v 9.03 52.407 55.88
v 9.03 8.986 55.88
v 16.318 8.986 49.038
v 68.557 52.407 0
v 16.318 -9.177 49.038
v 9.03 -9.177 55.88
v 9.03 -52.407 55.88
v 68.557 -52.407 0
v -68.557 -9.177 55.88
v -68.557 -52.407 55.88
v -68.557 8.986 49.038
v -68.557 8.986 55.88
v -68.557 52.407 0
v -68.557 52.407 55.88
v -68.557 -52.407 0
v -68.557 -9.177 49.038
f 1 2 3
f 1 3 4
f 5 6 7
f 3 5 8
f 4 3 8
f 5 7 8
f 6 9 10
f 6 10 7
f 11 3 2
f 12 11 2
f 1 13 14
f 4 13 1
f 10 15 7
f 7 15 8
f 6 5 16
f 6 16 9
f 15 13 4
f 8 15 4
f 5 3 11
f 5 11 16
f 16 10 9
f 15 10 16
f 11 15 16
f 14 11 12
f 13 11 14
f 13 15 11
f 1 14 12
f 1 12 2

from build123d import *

# Parameters (mm, degrees)
F0_W     = 137.114138
F0_H     = 104.813702
F1_DEPTH = 55.88
F3_DEPTH = 104.814702
F4_W     = 18.162367
F4_H     = 6.841612
F5_DEPTH = 137.115137


with BuildPart() as f1:
    # F0 (on Top) → F1 (new body)
    with BuildSketch(Plane.XY):
        Rectangle(F0_W, F0_H)
    extrude(amount=F1_DEPTH)

    # F2 (on face) → F3 (cut, through all)
    with BuildSketch(Plane.XZ.offset(52.406851)):
        Polygon((68.557069, 0), (68.557069, 55.88), (9.029833, 55.88), align=None)
    extrude(amount=-F3_DEPTH, mode=Mode.SUBTRACT)

    # F4 (on face) → F5 (cut, through all)
    with BuildSketch(Plane(origin=(-68.557069, 0, 0), x_dir=(0, -1, 0), z_dir=(-1, 0, 0))):
        with Locations((0.095591, 52.459194)):
            Rectangle(F4_W, F4_H)
    extrude(amount=-F5_DEPTH, mode=Mode.SUBTRACT)


solid = f1.part
